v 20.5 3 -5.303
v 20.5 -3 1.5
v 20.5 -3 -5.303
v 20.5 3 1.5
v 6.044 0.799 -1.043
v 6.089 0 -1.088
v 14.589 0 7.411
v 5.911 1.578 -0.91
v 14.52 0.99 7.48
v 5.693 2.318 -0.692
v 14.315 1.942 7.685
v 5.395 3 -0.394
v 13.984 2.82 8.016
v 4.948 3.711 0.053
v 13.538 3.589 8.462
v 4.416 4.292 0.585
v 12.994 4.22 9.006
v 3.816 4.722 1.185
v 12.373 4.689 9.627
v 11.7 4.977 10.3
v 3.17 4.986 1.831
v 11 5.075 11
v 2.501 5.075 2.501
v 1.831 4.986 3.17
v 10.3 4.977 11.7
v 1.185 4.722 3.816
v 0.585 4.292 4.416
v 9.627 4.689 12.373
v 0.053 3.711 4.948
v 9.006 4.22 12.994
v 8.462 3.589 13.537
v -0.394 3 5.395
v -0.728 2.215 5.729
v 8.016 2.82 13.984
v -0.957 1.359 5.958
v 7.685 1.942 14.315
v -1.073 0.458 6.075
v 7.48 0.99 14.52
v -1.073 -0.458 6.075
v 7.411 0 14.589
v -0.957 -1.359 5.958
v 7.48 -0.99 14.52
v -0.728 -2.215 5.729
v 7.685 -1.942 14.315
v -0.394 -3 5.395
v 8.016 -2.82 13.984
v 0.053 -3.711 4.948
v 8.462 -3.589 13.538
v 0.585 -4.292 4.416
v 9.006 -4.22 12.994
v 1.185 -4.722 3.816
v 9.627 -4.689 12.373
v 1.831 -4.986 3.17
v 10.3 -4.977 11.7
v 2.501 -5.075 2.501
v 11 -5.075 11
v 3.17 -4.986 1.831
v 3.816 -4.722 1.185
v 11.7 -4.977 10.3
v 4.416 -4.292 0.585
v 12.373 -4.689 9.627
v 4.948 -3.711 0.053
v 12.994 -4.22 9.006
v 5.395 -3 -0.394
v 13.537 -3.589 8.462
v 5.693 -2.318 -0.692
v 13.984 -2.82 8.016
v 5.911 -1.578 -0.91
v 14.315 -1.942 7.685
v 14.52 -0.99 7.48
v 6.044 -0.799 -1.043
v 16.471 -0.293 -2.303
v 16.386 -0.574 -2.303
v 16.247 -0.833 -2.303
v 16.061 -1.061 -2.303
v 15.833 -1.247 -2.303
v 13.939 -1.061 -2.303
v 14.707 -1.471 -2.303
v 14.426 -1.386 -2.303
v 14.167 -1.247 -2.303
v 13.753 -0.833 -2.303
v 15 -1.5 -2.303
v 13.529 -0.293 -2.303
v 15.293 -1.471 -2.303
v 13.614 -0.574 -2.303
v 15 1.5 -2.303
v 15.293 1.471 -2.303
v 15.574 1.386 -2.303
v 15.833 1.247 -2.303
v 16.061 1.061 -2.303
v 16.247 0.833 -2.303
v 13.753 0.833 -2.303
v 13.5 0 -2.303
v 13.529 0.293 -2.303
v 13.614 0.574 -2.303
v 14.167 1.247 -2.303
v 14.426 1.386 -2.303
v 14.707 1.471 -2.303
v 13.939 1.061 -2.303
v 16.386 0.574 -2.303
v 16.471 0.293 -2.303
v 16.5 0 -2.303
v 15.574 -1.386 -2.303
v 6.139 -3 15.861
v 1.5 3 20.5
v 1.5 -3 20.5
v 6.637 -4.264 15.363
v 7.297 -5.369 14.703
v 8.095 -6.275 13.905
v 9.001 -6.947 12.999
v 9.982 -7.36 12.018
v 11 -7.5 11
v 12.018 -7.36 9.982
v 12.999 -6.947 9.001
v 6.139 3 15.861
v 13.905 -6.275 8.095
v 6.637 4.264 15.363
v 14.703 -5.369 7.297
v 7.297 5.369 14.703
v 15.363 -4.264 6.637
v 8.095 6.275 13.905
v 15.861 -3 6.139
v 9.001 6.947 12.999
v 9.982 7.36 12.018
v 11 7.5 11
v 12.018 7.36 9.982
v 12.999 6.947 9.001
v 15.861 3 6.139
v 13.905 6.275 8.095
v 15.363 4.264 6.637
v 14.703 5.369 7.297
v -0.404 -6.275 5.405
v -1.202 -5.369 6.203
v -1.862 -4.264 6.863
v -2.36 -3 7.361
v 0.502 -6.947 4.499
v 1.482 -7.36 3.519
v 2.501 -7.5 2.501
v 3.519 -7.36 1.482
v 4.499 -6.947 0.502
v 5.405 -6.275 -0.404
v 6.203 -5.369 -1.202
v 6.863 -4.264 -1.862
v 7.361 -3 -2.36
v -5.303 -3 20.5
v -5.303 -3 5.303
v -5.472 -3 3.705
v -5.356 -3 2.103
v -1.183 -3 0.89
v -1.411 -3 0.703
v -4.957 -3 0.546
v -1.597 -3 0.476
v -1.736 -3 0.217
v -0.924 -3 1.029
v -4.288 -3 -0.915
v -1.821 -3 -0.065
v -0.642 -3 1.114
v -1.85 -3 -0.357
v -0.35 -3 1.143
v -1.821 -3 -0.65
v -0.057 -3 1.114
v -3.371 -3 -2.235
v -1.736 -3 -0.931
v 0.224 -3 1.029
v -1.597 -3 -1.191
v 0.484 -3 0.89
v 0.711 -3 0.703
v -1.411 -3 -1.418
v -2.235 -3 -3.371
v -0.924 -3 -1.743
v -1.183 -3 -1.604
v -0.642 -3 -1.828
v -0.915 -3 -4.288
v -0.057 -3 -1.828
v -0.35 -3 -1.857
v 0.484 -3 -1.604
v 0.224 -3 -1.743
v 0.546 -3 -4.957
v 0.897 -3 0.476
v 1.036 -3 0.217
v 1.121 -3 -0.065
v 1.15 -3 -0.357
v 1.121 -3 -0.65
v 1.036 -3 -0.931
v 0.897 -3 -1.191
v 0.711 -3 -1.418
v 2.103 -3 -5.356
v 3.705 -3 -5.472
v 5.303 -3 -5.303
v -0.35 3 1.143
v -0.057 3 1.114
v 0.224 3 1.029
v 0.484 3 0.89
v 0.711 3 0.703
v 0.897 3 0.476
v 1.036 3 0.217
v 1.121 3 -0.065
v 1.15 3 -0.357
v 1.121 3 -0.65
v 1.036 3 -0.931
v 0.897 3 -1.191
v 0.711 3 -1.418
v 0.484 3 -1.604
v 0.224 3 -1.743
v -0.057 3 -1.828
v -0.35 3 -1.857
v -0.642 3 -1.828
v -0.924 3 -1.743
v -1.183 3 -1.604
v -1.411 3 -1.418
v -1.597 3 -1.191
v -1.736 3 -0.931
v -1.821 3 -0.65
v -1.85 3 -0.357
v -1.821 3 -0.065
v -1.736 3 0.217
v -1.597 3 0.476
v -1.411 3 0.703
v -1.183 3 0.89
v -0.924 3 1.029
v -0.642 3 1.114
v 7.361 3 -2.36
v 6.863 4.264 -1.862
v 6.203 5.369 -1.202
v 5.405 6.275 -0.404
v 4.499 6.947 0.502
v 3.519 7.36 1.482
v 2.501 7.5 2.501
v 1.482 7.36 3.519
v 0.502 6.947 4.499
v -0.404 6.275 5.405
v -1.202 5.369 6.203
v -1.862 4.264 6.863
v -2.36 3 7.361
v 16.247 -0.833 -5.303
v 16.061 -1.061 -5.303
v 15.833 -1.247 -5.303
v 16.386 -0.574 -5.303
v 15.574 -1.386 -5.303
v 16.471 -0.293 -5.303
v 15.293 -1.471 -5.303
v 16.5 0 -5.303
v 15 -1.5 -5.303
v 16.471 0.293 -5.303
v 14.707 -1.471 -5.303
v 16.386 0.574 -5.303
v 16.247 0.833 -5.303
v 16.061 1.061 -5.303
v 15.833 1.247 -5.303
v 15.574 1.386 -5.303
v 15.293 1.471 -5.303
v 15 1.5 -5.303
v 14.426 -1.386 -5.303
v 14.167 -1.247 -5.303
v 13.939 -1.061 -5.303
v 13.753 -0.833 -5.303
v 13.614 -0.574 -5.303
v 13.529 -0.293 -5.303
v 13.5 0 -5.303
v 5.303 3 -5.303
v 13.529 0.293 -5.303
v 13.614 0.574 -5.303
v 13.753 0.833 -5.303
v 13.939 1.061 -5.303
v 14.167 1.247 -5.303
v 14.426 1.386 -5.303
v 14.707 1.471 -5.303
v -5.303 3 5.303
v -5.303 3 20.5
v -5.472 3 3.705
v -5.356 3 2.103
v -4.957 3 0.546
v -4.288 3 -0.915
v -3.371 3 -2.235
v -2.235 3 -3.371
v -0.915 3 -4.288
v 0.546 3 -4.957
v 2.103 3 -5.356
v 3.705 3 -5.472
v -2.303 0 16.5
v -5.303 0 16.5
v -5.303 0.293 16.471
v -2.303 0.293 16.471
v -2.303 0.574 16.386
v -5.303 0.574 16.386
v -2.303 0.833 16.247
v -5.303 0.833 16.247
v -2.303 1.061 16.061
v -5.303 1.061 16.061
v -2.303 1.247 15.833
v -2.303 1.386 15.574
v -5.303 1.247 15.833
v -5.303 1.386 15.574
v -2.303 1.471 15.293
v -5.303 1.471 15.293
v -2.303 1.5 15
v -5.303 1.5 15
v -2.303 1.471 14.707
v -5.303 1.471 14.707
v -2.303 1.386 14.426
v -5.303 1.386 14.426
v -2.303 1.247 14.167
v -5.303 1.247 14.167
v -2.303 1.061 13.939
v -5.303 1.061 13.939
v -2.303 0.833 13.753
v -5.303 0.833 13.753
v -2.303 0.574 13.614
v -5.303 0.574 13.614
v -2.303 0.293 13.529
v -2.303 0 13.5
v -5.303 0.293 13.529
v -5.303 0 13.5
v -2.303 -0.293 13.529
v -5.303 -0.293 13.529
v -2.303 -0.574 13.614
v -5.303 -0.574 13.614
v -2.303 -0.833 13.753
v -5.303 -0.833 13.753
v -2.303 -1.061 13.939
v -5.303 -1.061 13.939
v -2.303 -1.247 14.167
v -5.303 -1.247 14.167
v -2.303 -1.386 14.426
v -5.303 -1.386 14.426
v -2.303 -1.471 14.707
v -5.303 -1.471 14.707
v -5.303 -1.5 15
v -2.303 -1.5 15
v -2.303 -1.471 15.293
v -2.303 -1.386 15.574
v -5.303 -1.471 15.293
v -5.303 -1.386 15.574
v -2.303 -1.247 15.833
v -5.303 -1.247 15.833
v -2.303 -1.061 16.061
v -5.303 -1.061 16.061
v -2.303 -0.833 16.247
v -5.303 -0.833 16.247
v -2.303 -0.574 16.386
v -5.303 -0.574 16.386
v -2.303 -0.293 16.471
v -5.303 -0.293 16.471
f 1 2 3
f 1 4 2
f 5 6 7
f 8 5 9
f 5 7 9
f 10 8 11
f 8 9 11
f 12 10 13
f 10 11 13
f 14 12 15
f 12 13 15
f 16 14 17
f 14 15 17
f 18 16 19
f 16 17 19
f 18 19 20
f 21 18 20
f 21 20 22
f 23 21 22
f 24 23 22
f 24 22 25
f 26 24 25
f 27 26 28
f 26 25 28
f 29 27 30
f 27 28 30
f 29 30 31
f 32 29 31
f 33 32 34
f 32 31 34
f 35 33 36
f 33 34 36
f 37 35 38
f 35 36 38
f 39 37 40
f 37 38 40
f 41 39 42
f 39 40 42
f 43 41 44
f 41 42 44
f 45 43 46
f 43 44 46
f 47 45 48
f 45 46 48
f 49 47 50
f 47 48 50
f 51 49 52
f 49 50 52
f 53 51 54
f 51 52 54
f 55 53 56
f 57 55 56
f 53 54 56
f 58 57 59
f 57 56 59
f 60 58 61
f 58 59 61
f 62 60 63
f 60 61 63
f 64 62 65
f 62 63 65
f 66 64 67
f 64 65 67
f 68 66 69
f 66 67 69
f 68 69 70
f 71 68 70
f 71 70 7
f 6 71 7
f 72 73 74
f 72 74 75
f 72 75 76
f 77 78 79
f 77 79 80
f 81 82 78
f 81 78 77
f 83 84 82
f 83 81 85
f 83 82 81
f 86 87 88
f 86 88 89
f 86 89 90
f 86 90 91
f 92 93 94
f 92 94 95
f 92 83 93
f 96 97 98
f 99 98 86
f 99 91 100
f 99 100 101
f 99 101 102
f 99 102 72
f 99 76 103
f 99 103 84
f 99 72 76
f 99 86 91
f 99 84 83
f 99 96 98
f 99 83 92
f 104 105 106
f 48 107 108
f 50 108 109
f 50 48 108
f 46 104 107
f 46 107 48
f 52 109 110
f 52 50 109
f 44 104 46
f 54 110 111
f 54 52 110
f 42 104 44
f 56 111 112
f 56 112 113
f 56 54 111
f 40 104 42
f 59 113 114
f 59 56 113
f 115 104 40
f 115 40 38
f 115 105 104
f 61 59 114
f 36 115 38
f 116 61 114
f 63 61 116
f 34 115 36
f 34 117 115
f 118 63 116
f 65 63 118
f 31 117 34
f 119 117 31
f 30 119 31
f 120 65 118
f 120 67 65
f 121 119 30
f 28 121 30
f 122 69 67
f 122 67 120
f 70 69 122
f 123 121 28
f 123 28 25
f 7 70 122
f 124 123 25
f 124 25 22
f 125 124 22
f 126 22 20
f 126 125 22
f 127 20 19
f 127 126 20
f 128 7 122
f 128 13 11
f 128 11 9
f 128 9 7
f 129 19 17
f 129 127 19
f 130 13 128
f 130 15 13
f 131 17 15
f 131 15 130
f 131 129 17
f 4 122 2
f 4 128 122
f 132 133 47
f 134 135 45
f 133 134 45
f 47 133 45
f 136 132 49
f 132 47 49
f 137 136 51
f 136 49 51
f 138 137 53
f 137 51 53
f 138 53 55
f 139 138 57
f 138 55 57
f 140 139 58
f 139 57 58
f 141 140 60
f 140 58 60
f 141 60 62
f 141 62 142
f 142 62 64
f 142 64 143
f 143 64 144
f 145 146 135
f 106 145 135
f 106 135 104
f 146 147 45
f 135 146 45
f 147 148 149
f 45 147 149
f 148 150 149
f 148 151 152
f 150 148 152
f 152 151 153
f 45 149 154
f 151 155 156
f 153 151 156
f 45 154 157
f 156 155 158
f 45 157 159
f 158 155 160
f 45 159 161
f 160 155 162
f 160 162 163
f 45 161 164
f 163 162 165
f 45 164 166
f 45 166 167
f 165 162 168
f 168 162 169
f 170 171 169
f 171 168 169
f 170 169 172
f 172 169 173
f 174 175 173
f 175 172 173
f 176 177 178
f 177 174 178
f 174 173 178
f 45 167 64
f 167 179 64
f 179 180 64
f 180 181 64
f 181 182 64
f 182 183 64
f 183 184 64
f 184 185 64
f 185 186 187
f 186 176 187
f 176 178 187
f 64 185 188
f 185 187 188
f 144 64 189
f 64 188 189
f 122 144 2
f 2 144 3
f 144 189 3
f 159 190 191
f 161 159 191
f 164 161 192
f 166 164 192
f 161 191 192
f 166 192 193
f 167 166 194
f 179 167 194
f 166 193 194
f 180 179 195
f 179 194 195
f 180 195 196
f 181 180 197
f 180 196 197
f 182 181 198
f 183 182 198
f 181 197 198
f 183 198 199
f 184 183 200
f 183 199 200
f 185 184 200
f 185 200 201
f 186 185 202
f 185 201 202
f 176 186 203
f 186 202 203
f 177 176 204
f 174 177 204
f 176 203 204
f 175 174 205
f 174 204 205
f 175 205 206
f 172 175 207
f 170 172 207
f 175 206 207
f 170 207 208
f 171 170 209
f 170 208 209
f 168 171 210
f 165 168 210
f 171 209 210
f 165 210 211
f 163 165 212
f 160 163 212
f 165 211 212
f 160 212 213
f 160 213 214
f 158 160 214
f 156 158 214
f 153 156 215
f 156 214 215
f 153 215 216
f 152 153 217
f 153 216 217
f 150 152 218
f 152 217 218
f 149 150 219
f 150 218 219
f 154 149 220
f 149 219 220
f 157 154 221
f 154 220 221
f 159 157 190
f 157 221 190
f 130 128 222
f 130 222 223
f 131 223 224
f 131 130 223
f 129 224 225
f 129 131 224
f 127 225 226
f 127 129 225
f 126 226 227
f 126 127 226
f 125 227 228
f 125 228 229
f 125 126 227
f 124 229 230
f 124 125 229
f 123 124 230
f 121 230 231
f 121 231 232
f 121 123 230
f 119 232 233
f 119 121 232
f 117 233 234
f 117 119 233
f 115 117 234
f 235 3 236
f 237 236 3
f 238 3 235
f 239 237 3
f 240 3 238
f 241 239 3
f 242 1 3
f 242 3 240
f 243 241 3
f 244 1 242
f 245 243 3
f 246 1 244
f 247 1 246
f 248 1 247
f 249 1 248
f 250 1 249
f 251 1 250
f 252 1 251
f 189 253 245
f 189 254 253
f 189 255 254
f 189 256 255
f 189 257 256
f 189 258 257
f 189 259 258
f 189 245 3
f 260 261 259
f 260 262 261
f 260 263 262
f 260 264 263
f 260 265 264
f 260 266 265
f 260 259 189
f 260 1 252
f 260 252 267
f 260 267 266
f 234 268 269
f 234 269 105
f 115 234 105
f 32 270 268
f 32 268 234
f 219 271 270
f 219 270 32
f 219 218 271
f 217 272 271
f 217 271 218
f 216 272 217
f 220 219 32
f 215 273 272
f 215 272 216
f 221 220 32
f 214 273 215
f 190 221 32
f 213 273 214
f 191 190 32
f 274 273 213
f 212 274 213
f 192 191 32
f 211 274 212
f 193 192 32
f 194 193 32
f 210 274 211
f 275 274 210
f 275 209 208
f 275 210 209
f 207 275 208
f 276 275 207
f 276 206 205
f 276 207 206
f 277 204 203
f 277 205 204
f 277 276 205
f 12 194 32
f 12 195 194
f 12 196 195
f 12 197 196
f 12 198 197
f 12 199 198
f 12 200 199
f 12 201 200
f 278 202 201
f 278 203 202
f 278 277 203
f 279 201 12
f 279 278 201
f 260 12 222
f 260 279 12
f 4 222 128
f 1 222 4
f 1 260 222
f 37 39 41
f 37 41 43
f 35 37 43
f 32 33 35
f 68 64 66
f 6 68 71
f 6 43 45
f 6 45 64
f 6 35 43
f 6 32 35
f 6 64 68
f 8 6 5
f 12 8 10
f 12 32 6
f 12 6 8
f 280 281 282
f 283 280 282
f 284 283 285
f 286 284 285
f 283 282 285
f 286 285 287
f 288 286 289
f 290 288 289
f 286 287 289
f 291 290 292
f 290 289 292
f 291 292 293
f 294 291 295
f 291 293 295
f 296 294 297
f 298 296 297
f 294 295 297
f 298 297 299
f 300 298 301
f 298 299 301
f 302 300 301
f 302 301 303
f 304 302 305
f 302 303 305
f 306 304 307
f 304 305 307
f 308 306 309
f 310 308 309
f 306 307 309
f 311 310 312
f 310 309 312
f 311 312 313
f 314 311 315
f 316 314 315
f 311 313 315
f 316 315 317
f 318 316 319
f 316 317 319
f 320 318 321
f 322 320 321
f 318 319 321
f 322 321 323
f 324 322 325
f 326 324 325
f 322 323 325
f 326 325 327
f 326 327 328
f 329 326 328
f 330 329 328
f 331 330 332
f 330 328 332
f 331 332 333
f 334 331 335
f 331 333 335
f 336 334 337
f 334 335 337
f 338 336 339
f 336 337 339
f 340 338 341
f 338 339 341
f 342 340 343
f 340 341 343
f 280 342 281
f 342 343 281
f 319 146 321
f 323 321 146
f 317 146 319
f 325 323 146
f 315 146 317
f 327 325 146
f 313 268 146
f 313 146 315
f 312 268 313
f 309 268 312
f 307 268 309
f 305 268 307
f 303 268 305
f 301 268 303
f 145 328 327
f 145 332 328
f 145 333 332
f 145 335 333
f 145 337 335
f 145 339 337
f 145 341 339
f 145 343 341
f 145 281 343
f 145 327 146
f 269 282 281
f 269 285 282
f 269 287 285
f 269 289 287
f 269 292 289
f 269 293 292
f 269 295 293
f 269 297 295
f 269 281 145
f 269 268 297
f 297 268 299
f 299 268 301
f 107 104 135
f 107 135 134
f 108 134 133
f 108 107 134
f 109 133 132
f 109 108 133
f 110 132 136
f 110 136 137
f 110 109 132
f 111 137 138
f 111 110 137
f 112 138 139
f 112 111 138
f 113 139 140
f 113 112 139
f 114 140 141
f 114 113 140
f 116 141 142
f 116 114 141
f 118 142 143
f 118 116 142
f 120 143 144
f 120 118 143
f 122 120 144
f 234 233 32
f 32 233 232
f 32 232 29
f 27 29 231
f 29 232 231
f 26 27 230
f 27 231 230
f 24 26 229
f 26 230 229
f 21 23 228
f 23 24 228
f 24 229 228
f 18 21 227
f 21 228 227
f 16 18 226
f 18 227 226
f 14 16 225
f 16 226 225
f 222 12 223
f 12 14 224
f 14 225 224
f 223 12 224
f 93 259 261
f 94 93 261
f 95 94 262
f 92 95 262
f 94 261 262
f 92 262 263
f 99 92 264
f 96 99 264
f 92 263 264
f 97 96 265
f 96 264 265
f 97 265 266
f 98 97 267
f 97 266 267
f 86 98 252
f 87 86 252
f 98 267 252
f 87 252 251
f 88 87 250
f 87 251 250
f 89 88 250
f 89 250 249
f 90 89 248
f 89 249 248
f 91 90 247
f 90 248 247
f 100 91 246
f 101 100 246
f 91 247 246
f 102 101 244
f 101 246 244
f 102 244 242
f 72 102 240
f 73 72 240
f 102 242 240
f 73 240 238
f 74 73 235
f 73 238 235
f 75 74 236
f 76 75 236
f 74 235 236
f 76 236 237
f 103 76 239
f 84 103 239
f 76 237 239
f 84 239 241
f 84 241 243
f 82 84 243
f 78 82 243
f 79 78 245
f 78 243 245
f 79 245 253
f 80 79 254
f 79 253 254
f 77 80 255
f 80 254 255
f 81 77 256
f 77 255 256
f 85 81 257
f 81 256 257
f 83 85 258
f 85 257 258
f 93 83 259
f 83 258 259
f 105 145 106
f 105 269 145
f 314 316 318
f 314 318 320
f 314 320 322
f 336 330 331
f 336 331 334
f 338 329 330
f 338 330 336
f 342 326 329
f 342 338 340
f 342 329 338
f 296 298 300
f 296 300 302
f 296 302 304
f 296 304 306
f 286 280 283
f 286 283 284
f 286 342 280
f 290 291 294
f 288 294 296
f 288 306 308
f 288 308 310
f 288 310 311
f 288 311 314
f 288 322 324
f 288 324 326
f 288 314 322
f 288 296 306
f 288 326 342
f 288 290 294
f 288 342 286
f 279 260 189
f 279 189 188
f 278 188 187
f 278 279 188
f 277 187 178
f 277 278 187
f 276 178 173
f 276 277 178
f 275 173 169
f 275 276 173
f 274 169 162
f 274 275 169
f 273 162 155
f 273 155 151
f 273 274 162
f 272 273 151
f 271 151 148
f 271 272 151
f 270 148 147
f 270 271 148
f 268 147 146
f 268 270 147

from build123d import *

# Parameters (mm, degrees)
BOSS_EXTRUDE1_DEPTH = 3
SKETCH2_R           = 7.5
SKETCH2_R_2         = 5.075
BOSS_EXTRUDE2_DEPTH = 12.02
SKETCH3_R           = 5.075
CUT_EXTRUDE1_DEPTH  = 12.02
SKETCH4_R           = 1.5
CUT_EXTRUDE2_DEPTH  = 6
SKETCH5_R           = 1.5
CUT_EXTRUDE3_DEPTH  = 3
SKETCH6_R           = 1.5
CUT_EXTRUDE4_DEPTH  = 3


with BuildPart() as part:
    # Sketch1 → Boss-Extrude1 (new, symmetric)
    with BuildSketch(Plane(origin=(0, 0, 0), x_dir=(1, 0, 0), z_dir=(0, 1, 0))):
        with BuildLine():
            Line((20.5, -1.5), (20.5, 0))
            Line((20.5, 0), (20.5, 2.035533906))
            Line((20.5, 2.035533906), (20.5, 3.535533906))
            Line((20.5, 3.535533906), (20.5, 5.303300859))
            Line((20.5, 5.303300859), (5.303300859, 5.303300859))
            ThreePointArc((5.303300859, 5.303300859), (-2.828427125, 2.828427125), (-5.303300859, -5.303300859))
            Line((-5.303300859, -5.303300859), (-5.303300859, -20.5))
            Line((-5.303300859, -20.5), (-3.535533906, -20.5))
            Line((-3.535533906, -20.5), (-2.035533906, -20.5))
            Line((-2.035533906, -20.5), (0, -20.5))
            Line((0, -20.5), (1.5, -20.5))
            Line((1.5, -20.5), (20.5, -1.5))
        make_face()
    extrude(amount=BOSS_EXTRUDE1_DEPTH, both=True)

    # Sketch2 → Boss-Extrude2 (add)
    with BuildSketch(Plane(origin=(11, 0, 11), x_dir=(0.7071067811865475, 0, -0.7071067811865477), z_dir=(0.7071067811865477, 0, 0.7071067811865475))):
        Circle(SKETCH2_R)
        Circle(SKETCH2_R_2, mode=Mode.SUBTRACT)
    extrude(amount=-BOSS_EXTRUDE2_DEPTH)

    # Sketch3 → Cut-Extrude1 (cut)
    with BuildSketch(Plane(origin=(11, 0, 11), x_dir=(0.7071067811865475, 0, -0.7071067811865477), z_dir=(0.7071067811865477, 0, 0.7071067811865475))):
        Circle(SKETCH3_R)
    extrude(amount=-CUT_EXTRUDE1_DEPTH, mode=Mode.SUBTRACT)

    # Sketch4 → Cut-Extrude2 (cut)
    with BuildSketch(Plane(origin=(0, 3, 0), x_dir=(1, 0, 0), z_dir=(0, 1, 0))):
        with Locations(Location((-0.349848925, 0.357263409, 0), (0, 0, 270))):
            Circle(SKETCH4_R)
    extrude(amount=-CUT_EXTRUDE2_DEPTH, mode=Mode.SUBTRACT)

    # Sketch5 → Cut-Extrude3 (cut)
    with BuildSketch(Plane.ZY.offset(5.303300859)):
        with Locations((15, 0)):
            Circle(SKETCH5_R)
    extrude(amount=-CUT_EXTRUDE3_DEPTH, mode=Mode.SUBTRACT)

    # Sketch6 → Cut-Extrude4 (cut)
    with BuildSketch(Plane(origin=(0, 0, -5.303300859), x_dir=(-1, 0, 0), z_dir=(0, 0, -1))):
        with Locations((-15, 0)):
            Circle(SKETCH6_R)
    extrude(amount=-CUT_EXTRUDE4_DEPTH, mode=Mode.SUBTRACT)


solid = part.part
